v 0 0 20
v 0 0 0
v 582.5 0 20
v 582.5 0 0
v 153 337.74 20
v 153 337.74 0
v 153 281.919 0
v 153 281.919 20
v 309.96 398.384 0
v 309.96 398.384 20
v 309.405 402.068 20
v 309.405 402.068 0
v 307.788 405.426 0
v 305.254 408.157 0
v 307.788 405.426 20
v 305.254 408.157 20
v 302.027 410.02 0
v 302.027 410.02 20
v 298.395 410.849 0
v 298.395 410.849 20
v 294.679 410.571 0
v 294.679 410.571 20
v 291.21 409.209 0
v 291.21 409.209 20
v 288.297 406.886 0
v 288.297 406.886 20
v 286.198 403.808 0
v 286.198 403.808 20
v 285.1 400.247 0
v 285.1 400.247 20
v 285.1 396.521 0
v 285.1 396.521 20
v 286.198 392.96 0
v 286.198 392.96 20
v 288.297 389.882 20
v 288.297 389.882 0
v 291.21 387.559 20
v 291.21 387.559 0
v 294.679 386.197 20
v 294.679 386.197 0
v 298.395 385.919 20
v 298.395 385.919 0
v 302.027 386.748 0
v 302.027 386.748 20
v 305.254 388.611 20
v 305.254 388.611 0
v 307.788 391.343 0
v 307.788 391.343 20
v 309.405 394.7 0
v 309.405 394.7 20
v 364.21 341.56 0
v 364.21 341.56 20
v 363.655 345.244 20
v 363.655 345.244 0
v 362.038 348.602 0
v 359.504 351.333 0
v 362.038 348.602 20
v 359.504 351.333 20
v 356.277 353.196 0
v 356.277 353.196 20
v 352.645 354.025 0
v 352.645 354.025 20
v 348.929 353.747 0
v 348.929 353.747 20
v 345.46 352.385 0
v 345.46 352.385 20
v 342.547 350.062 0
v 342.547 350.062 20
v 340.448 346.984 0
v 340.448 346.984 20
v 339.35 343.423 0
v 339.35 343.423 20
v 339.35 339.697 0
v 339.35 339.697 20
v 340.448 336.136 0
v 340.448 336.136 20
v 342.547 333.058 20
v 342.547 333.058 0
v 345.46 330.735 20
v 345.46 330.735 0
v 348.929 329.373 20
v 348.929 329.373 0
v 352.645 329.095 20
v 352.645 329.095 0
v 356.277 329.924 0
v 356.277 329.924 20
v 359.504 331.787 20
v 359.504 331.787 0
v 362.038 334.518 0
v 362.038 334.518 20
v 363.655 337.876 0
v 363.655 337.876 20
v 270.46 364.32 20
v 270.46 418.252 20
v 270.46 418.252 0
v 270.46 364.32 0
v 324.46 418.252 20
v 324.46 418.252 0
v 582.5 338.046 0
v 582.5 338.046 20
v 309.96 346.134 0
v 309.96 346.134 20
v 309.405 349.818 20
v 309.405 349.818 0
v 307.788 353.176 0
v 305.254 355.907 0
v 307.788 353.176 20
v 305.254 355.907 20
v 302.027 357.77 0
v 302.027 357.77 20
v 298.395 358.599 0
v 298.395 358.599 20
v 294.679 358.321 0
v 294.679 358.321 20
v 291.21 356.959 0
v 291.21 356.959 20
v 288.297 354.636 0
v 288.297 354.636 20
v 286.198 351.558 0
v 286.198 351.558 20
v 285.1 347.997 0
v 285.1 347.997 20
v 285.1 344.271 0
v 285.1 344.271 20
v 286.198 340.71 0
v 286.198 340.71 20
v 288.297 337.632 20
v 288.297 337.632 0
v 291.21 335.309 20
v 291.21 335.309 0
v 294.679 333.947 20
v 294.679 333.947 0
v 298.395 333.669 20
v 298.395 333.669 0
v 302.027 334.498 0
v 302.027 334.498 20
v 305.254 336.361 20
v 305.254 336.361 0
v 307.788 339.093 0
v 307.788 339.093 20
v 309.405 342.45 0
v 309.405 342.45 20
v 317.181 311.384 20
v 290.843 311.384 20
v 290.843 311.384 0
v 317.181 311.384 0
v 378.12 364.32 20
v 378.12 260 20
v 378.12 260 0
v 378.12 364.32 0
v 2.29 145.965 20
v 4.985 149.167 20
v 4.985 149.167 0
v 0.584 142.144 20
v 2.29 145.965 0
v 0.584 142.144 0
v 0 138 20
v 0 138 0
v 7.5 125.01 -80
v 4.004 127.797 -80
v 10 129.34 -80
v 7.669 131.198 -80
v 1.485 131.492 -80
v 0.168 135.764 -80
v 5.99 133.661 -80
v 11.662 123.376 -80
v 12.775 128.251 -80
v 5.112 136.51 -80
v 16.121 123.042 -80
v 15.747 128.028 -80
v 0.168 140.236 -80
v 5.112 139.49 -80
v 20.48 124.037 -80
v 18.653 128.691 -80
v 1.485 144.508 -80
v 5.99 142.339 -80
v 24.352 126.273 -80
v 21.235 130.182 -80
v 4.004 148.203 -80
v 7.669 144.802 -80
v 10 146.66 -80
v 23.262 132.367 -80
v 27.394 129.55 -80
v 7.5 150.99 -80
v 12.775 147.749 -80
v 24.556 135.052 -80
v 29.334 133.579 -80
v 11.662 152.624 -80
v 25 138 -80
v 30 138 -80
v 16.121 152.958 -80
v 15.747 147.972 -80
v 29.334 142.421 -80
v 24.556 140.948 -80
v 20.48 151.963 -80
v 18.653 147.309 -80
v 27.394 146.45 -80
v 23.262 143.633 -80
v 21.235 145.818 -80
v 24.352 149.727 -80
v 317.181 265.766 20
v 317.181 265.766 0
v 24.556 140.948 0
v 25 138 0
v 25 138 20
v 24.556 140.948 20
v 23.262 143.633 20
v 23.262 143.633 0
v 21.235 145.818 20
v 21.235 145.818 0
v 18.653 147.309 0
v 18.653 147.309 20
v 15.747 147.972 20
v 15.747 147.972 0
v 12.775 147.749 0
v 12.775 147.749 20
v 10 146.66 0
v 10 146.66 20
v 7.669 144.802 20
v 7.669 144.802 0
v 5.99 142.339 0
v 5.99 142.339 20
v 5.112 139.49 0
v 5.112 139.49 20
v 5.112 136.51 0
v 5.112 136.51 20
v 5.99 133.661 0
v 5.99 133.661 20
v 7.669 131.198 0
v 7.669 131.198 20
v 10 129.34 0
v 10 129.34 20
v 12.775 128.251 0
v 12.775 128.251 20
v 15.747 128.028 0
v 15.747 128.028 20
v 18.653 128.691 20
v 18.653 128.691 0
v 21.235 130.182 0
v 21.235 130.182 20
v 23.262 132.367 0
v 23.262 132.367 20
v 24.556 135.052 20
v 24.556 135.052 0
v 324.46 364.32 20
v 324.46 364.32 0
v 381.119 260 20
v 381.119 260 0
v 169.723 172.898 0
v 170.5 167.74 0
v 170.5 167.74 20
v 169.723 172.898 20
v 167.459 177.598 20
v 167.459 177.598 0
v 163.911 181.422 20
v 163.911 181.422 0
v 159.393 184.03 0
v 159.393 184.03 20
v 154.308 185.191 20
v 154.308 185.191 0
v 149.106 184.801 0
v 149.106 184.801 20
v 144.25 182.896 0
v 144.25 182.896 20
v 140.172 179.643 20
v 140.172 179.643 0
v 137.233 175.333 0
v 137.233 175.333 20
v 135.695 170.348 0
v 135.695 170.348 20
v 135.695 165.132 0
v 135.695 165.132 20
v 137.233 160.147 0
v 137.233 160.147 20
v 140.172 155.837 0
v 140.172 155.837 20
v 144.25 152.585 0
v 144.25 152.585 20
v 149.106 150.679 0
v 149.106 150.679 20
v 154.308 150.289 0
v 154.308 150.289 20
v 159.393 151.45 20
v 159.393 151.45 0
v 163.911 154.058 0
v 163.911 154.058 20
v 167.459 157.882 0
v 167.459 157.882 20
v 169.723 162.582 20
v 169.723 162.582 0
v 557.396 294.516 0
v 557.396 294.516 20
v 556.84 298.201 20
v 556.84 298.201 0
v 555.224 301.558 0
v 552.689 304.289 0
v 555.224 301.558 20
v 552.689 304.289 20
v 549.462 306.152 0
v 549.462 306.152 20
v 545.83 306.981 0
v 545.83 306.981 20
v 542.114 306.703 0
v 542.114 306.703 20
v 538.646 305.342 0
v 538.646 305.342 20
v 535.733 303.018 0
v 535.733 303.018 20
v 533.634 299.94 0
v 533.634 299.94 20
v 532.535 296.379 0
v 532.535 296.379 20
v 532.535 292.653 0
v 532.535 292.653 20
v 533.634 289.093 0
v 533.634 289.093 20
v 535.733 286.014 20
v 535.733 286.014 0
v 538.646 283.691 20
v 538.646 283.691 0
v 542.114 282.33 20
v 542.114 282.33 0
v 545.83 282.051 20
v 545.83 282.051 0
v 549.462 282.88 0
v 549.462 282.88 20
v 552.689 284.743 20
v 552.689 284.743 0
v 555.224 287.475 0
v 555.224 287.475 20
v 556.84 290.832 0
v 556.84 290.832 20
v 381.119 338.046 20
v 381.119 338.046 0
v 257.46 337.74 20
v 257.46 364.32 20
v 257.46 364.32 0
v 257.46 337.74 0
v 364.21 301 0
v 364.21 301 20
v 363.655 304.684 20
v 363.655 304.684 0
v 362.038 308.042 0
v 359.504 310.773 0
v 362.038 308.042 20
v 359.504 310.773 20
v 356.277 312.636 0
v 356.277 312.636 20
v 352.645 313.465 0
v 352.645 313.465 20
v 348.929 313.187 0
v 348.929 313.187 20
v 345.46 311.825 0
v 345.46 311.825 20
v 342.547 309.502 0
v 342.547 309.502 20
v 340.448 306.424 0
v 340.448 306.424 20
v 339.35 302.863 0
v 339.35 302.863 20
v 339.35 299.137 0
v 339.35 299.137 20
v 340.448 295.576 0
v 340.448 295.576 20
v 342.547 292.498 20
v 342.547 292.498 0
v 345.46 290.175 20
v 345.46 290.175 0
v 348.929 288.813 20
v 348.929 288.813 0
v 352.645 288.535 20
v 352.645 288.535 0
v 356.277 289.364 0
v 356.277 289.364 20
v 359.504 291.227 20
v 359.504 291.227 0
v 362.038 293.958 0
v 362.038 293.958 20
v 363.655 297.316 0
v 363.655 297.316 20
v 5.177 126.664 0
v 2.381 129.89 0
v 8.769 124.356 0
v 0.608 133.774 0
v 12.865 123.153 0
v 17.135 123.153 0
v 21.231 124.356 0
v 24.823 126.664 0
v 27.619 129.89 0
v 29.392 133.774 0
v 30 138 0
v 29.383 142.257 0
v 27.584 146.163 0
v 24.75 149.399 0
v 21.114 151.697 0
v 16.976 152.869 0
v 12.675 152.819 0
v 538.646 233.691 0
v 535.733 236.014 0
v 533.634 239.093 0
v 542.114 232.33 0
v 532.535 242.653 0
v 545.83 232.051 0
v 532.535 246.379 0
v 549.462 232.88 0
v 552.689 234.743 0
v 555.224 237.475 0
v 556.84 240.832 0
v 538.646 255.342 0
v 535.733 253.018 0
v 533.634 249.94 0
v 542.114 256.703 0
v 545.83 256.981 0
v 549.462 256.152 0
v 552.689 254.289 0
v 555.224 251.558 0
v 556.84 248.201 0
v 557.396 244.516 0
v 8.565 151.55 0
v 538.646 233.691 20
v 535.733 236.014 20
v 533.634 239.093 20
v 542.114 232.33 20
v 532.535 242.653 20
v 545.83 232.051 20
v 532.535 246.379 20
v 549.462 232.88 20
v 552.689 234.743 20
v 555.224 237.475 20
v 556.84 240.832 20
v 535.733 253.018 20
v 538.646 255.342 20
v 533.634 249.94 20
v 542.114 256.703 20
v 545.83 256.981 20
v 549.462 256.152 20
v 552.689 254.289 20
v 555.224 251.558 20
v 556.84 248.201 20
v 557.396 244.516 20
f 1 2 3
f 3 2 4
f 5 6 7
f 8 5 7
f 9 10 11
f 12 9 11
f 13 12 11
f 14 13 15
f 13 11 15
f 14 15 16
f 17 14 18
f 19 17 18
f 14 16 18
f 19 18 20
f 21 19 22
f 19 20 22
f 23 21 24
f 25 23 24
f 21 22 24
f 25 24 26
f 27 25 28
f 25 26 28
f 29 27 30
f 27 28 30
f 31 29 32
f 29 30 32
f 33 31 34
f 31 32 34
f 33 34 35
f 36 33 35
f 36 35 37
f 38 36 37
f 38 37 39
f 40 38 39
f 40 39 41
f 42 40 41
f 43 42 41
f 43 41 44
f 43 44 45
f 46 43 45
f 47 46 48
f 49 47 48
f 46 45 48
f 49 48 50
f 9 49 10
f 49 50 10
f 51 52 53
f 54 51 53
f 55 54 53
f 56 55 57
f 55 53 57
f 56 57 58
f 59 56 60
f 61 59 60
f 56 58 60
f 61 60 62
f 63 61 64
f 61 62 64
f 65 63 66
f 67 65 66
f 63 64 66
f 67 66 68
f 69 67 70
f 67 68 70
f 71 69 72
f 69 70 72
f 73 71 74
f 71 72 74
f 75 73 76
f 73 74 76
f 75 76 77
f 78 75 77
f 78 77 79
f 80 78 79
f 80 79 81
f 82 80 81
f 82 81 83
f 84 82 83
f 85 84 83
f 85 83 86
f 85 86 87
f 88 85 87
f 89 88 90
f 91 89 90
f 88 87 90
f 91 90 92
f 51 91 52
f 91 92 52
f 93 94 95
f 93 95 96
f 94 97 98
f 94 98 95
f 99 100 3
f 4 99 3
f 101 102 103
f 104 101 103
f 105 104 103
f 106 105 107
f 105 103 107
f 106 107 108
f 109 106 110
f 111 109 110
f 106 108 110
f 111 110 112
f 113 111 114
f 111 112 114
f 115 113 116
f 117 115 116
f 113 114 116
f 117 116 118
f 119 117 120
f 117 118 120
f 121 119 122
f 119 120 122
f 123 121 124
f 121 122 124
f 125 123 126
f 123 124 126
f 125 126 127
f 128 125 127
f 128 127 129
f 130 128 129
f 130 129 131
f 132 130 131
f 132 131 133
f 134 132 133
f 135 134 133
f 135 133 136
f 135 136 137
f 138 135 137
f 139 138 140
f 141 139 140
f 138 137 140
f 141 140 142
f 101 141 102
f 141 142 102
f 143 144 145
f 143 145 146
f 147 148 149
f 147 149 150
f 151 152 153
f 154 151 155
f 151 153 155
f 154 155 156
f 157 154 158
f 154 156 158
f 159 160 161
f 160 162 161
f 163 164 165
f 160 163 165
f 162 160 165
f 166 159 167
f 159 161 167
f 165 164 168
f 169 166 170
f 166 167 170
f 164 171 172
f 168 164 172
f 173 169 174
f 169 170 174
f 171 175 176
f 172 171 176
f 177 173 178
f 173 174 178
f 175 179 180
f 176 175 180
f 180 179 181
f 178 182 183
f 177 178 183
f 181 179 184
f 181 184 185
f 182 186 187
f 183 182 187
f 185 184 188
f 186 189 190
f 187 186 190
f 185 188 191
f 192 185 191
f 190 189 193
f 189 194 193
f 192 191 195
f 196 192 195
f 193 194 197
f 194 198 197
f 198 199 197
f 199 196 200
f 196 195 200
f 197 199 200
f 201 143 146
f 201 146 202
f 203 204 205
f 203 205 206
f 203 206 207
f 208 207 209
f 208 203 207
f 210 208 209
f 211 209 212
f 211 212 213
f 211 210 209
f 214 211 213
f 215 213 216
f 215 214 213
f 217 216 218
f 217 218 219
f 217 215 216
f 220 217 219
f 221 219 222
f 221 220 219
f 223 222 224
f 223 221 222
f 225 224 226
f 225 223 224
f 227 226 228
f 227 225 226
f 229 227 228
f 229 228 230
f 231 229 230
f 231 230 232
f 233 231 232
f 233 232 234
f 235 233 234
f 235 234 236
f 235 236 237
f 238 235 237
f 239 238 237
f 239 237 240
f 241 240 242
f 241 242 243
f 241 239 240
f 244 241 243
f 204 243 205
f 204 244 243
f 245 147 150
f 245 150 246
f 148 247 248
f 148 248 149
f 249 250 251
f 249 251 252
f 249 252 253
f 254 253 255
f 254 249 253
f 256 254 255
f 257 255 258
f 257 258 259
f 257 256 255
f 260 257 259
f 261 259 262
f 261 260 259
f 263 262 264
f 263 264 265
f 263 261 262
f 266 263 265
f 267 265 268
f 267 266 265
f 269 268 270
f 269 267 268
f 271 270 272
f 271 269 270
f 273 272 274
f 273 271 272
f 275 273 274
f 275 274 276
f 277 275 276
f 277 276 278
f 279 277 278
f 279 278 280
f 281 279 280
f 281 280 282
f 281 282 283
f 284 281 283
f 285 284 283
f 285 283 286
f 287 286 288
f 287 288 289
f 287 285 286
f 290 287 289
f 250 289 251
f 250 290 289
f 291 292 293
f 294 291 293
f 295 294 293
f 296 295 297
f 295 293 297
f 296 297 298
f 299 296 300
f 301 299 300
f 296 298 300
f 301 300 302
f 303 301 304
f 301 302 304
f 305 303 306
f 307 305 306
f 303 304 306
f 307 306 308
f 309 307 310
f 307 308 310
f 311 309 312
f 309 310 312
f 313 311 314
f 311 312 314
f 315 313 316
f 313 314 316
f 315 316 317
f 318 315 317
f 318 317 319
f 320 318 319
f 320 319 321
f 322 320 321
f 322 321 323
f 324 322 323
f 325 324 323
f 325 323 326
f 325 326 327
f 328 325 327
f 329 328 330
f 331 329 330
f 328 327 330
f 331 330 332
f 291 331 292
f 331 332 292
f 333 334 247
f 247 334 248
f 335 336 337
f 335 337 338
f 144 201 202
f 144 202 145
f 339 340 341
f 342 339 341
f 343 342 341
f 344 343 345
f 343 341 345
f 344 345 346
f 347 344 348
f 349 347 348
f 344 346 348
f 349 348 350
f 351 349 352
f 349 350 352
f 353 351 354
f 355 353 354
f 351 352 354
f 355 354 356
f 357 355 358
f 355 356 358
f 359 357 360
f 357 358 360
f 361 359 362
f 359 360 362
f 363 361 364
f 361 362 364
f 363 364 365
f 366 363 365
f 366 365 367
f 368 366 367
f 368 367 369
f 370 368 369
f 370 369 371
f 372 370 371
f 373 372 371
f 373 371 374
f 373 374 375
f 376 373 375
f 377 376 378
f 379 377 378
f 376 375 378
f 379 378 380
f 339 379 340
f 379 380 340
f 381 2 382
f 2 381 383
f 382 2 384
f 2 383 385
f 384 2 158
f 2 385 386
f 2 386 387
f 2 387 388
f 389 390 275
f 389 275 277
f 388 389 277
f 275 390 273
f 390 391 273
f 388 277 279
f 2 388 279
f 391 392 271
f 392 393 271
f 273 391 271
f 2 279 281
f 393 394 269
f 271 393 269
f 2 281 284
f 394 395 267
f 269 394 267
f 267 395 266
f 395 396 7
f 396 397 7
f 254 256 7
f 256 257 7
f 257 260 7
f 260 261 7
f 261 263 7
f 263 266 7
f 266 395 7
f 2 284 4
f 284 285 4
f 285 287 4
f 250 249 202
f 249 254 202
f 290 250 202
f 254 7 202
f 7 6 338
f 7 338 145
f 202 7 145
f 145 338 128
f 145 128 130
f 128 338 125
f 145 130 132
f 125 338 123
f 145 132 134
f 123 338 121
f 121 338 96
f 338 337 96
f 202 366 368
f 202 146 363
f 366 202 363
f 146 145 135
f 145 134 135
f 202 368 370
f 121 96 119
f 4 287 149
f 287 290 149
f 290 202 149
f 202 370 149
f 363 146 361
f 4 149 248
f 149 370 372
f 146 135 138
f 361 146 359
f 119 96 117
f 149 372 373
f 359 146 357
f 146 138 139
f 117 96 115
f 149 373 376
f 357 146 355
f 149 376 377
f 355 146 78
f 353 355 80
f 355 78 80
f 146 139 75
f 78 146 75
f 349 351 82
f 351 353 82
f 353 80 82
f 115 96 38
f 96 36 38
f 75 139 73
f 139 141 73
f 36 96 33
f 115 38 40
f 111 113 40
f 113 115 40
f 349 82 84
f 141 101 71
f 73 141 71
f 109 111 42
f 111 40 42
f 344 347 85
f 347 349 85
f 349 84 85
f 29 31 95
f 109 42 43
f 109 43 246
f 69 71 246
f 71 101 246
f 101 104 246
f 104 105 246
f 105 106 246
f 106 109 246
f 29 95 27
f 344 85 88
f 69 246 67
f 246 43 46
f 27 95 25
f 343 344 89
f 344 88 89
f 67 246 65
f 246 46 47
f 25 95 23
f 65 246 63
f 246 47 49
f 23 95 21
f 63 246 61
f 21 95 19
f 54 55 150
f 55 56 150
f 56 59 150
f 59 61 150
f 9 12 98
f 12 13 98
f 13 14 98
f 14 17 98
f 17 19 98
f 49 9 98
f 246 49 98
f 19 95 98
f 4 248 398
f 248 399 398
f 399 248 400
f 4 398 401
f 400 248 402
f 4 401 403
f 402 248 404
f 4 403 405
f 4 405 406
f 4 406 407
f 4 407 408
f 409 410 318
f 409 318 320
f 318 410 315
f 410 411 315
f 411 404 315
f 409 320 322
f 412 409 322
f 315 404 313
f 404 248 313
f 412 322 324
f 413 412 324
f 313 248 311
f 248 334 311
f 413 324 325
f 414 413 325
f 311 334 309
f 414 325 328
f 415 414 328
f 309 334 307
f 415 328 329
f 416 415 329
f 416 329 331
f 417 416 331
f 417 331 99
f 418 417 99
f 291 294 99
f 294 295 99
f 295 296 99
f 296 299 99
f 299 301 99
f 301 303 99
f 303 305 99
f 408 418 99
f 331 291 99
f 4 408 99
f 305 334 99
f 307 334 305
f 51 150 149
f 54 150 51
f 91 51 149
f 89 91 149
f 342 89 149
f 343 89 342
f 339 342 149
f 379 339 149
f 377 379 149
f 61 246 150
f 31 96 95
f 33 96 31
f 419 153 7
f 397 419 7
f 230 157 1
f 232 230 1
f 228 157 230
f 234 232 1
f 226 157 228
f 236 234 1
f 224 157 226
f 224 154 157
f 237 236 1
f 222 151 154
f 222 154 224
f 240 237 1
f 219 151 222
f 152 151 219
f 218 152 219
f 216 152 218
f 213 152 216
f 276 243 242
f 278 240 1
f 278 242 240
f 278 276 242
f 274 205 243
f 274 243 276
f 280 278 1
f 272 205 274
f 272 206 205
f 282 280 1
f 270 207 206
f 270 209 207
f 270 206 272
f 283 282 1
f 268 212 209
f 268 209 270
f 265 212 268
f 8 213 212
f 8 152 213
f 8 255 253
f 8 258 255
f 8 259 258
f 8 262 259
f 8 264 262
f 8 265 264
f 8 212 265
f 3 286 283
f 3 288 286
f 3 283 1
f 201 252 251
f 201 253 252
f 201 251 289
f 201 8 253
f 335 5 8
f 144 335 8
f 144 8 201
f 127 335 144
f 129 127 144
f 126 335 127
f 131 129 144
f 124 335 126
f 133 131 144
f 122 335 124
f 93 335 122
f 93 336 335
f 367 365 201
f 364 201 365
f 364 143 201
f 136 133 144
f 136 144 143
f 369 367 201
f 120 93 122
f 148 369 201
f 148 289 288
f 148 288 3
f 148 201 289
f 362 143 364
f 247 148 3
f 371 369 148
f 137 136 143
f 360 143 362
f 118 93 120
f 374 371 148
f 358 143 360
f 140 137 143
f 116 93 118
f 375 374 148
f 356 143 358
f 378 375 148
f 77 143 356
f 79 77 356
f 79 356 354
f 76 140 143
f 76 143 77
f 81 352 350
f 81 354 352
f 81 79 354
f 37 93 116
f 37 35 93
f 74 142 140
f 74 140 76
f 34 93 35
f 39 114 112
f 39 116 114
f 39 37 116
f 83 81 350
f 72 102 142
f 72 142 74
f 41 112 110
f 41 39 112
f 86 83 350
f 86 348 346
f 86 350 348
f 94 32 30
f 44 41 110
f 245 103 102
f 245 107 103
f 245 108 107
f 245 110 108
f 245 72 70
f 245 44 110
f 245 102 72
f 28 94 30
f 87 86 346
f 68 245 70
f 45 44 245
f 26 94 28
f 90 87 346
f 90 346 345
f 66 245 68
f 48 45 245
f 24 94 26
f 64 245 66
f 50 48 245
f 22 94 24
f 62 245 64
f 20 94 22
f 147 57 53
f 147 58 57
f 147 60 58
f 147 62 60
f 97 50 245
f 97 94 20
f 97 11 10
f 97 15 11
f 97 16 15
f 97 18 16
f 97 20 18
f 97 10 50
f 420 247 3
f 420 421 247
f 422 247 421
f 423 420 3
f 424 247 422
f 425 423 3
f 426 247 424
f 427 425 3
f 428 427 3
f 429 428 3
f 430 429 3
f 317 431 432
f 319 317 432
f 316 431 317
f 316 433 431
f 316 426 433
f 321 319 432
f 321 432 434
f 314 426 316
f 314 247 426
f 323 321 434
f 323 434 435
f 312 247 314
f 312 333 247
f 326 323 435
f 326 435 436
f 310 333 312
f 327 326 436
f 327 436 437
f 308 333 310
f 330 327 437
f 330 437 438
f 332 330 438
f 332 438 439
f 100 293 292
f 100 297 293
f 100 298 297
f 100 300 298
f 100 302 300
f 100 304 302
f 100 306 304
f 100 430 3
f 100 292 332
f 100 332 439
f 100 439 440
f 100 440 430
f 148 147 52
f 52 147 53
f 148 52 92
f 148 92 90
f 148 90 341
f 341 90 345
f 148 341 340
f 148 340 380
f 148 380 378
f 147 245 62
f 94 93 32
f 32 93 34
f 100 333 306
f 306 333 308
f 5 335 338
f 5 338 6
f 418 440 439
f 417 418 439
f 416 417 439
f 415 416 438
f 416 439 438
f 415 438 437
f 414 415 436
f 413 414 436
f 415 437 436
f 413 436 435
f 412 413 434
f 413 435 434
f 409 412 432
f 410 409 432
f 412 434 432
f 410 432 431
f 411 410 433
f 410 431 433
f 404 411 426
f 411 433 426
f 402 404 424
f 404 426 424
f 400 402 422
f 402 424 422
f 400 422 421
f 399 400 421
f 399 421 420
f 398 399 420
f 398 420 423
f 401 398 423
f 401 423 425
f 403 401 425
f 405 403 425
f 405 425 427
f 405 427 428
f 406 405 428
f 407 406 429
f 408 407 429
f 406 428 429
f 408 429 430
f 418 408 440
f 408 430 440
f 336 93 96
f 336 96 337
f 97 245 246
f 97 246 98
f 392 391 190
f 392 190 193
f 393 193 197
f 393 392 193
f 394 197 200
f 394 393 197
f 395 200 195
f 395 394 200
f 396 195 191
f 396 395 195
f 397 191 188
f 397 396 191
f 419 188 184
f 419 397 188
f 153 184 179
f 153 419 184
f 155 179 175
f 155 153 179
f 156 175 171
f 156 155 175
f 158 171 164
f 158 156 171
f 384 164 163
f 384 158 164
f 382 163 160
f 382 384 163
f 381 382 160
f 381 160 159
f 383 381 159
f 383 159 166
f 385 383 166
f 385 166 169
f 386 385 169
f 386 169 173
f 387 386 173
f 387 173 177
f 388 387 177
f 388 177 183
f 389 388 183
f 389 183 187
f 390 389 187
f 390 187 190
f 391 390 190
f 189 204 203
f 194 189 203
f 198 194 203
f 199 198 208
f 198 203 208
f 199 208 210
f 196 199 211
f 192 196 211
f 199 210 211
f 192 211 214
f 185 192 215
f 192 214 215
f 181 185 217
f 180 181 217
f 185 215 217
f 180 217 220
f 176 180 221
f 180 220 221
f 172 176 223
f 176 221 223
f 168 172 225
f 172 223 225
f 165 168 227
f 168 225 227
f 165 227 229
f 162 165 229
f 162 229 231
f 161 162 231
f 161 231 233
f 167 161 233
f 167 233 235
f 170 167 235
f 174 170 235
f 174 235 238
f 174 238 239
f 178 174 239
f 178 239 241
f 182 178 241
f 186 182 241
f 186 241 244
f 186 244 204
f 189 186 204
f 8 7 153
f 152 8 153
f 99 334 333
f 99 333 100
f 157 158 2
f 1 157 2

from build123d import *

# Parameters (mm, degrees)
SKETCH1_R            = 17.5
SKETCH1_R_2          = 10
BOSS_EXTRUDE1_DEPTH  = 20
SKETCH2_R            = 15
SKETCH2_R_2          = 10
BOSS_EXTRUDE2_DEPTH  = 100
BOSS_EXTRUDE6_DEPTH  = 20
BOSS_EXTRUDE7_DEPTH  = 20
SKETCH10_R           = 12.5
BOSS_EXTRUDE9_DEPTH  = 20
BOSS_EXTRUDE10_DEPTH = 20
SKETCH16_R           = 12.5
CUT_EXTRUDE1_DEPTH   = 20


with BuildPart() as part:
    # Sketch1 → Boss-Extrude1 (new body)
    with BuildSketch(Plane.XY):
        with BuildLine():
            Line((0, 138), (0, 0))
            Line((0, 0), (582.5, 0))
            Line((582.5, 0), (582.5, 51.183651))
            Line((582.5, 51.183651), (572.5, 51.183651))
            Line((572.5, 51.183651), (374.6494, 86.07005))
            Line((374.6494, 86.07005), (244.94, 310.733321))
            ThreePointArc((244.94, 310.733321), (200.912249, 330.84879), (153, 337.740187))
            Line((153, 337.740187), (153, 281.918848))
            Line((153, 281.918848), (4.984782, 149.16671))
            ThreePointArc((4.984782, 149.16671), (1.302769, 144.114398), (0, 138))
        make_face()
        with Locations((153, 167.740187)):
            Circle(SKETCH1_R, mode=Mode.SUBTRACT)
        with Locations((15, 138)):
            Circle(SKETCH1_R_2, mode=Mode.SUBTRACT)
    extrude(amount=BOSS_EXTRUDE1_DEPTH)

    # Sketch2 → Boss-Extrude2 (add)
    with BuildSketch(Plane.XY.offset(20)):
        with Locations((15, 138)):
            Circle(SKETCH2_R)
        with Locations((15, 138)):
            Circle(SKETCH2_R_2, mode=Mode.SUBTRACT)
    extrude(amount=-BOSS_EXTRUDE2_DEPTH)

    # Sketch4 → Boss-Extrude6 (add)
    with BuildSketch(Plane.XY.offset(20)):
        with BuildLine():
            Line((257.460496, 337.740187), (153, 337.740187))
            ThreePointArc((153, 337.740187), (200.912249, 330.84879), (244.94, 310.733321))
            Line((244.94, 310.733321), (374.6494, 86.07005))
            Line((374.6494, 86.07005), (426.173106, 76.98503))
            Line((426.173106, 76.98503), (290.842774, 311.384043))
            Line((290.842774, 311.384043), (257.460496, 311.384043))
            Line((257.460496, 311.384043), (257.460496, 337.740187))
        make_face()
    extrude(amount=-BOSS_EXTRUDE6_DEPTH)

    # Sketch9 → Boss-Extrude7 (add)
    with BuildSketch(Plane.XY.offset(20)):
        Polygon((320.509364, 260), (522.5, 260), (582.5, 260), (582.5, 51.183651), (572.5, 51.183651), (522.5, 60), (426.173106, 76.98503), align=None)
    extrude(amount=-BOSS_EXTRUDE7_DEPTH)



with BuildPart() as body_2:
    # Sketch10 → Boss-Extrude9 (new body)
    with BuildSketch(Plane.XY.offset(20)):
        Polygon((270.460496, 418.251615), (270.460496, 364.320187), (317.180522, 364.320187), (324.460496, 364.320187), (324.460496, 418.251615), align=None)
        with Locations((297.460496, 398.384043)):
            Circle(SKETCH10_R, mode=Mode.SUBTRACT)
        Polygon((270.460496, 364.320187), (257.460496, 364.320187), (257.460496, 337.740187), (257.460496, 311.384043), (290.842774, 311.384043), (317.180522, 311.384043), (317.180522, 321.223855), (317.180522, 364.320187), align=None)
        with Locations((297.460496, 346.134043)):
            Circle(SKETCH10_R, mode=Mode.SUBTRACT)
        Polygon((324.460496, 364.320187), (317.180522, 364.320187), (317.180522, 321.223855), (347.650509, 321.223855), (378.120496, 321.223855), (378.120496, 364.320187), align=None)
        with Locations((351.710496, 341.56)):
            Circle(SKETCH10_R, mode=Mode.SUBTRACT)
        Polygon((347.650509, 321.223855), (317.180522, 321.223855), (317.180522, 311.384043), (317.180522, 265.765724), (320.509364, 260), (378.120496, 260), (378.120496, 321.223855), align=None)
        with Locations((351.710496, 301)):
            Circle(SKETCH10_R, mode=Mode.SUBTRACT)
    extrude(amount=-BOSS_EXTRUDE9_DEPTH)


with BuildPart() as part_1:
    add(part.part)

    add(body_2.part)  # Boss-Extrude10 merges body 2
    # Sketch14 → Boss-Extrude10 (add)
    with BuildSketch(Plane(origin=(0, 0, 0), x_dir=(-1, 0, 0), z_dir=(0, 0, -1))):
        Polygon((-320.509364, 260), (-426.173106, 76.98503), (-522.5, 60), (-572.5, 60), (-582.5, 60), (-582.5, 338.045557), (-522.5, 338.045557), (-381.119364, 338.045557), (-381.119364, 260), align=None)
    extrude(amount=-BOSS_EXTRUDE10_DEPTH)

    # Sketch16 → Cut-Extrude1 (cut)
    with BuildSketch(Plane.XY.offset(20)):
        with Locations((544.895661, 294.516191)):
            Circle(SKETCH16_R)
        with Locations((544.895661, 244.516191)):
            Circle(SKETCH16_R)
    extrude(amount=-CUT_EXTRUDE1_DEPTH, mode=Mode.SUBTRACT)


solid = part_1.part
